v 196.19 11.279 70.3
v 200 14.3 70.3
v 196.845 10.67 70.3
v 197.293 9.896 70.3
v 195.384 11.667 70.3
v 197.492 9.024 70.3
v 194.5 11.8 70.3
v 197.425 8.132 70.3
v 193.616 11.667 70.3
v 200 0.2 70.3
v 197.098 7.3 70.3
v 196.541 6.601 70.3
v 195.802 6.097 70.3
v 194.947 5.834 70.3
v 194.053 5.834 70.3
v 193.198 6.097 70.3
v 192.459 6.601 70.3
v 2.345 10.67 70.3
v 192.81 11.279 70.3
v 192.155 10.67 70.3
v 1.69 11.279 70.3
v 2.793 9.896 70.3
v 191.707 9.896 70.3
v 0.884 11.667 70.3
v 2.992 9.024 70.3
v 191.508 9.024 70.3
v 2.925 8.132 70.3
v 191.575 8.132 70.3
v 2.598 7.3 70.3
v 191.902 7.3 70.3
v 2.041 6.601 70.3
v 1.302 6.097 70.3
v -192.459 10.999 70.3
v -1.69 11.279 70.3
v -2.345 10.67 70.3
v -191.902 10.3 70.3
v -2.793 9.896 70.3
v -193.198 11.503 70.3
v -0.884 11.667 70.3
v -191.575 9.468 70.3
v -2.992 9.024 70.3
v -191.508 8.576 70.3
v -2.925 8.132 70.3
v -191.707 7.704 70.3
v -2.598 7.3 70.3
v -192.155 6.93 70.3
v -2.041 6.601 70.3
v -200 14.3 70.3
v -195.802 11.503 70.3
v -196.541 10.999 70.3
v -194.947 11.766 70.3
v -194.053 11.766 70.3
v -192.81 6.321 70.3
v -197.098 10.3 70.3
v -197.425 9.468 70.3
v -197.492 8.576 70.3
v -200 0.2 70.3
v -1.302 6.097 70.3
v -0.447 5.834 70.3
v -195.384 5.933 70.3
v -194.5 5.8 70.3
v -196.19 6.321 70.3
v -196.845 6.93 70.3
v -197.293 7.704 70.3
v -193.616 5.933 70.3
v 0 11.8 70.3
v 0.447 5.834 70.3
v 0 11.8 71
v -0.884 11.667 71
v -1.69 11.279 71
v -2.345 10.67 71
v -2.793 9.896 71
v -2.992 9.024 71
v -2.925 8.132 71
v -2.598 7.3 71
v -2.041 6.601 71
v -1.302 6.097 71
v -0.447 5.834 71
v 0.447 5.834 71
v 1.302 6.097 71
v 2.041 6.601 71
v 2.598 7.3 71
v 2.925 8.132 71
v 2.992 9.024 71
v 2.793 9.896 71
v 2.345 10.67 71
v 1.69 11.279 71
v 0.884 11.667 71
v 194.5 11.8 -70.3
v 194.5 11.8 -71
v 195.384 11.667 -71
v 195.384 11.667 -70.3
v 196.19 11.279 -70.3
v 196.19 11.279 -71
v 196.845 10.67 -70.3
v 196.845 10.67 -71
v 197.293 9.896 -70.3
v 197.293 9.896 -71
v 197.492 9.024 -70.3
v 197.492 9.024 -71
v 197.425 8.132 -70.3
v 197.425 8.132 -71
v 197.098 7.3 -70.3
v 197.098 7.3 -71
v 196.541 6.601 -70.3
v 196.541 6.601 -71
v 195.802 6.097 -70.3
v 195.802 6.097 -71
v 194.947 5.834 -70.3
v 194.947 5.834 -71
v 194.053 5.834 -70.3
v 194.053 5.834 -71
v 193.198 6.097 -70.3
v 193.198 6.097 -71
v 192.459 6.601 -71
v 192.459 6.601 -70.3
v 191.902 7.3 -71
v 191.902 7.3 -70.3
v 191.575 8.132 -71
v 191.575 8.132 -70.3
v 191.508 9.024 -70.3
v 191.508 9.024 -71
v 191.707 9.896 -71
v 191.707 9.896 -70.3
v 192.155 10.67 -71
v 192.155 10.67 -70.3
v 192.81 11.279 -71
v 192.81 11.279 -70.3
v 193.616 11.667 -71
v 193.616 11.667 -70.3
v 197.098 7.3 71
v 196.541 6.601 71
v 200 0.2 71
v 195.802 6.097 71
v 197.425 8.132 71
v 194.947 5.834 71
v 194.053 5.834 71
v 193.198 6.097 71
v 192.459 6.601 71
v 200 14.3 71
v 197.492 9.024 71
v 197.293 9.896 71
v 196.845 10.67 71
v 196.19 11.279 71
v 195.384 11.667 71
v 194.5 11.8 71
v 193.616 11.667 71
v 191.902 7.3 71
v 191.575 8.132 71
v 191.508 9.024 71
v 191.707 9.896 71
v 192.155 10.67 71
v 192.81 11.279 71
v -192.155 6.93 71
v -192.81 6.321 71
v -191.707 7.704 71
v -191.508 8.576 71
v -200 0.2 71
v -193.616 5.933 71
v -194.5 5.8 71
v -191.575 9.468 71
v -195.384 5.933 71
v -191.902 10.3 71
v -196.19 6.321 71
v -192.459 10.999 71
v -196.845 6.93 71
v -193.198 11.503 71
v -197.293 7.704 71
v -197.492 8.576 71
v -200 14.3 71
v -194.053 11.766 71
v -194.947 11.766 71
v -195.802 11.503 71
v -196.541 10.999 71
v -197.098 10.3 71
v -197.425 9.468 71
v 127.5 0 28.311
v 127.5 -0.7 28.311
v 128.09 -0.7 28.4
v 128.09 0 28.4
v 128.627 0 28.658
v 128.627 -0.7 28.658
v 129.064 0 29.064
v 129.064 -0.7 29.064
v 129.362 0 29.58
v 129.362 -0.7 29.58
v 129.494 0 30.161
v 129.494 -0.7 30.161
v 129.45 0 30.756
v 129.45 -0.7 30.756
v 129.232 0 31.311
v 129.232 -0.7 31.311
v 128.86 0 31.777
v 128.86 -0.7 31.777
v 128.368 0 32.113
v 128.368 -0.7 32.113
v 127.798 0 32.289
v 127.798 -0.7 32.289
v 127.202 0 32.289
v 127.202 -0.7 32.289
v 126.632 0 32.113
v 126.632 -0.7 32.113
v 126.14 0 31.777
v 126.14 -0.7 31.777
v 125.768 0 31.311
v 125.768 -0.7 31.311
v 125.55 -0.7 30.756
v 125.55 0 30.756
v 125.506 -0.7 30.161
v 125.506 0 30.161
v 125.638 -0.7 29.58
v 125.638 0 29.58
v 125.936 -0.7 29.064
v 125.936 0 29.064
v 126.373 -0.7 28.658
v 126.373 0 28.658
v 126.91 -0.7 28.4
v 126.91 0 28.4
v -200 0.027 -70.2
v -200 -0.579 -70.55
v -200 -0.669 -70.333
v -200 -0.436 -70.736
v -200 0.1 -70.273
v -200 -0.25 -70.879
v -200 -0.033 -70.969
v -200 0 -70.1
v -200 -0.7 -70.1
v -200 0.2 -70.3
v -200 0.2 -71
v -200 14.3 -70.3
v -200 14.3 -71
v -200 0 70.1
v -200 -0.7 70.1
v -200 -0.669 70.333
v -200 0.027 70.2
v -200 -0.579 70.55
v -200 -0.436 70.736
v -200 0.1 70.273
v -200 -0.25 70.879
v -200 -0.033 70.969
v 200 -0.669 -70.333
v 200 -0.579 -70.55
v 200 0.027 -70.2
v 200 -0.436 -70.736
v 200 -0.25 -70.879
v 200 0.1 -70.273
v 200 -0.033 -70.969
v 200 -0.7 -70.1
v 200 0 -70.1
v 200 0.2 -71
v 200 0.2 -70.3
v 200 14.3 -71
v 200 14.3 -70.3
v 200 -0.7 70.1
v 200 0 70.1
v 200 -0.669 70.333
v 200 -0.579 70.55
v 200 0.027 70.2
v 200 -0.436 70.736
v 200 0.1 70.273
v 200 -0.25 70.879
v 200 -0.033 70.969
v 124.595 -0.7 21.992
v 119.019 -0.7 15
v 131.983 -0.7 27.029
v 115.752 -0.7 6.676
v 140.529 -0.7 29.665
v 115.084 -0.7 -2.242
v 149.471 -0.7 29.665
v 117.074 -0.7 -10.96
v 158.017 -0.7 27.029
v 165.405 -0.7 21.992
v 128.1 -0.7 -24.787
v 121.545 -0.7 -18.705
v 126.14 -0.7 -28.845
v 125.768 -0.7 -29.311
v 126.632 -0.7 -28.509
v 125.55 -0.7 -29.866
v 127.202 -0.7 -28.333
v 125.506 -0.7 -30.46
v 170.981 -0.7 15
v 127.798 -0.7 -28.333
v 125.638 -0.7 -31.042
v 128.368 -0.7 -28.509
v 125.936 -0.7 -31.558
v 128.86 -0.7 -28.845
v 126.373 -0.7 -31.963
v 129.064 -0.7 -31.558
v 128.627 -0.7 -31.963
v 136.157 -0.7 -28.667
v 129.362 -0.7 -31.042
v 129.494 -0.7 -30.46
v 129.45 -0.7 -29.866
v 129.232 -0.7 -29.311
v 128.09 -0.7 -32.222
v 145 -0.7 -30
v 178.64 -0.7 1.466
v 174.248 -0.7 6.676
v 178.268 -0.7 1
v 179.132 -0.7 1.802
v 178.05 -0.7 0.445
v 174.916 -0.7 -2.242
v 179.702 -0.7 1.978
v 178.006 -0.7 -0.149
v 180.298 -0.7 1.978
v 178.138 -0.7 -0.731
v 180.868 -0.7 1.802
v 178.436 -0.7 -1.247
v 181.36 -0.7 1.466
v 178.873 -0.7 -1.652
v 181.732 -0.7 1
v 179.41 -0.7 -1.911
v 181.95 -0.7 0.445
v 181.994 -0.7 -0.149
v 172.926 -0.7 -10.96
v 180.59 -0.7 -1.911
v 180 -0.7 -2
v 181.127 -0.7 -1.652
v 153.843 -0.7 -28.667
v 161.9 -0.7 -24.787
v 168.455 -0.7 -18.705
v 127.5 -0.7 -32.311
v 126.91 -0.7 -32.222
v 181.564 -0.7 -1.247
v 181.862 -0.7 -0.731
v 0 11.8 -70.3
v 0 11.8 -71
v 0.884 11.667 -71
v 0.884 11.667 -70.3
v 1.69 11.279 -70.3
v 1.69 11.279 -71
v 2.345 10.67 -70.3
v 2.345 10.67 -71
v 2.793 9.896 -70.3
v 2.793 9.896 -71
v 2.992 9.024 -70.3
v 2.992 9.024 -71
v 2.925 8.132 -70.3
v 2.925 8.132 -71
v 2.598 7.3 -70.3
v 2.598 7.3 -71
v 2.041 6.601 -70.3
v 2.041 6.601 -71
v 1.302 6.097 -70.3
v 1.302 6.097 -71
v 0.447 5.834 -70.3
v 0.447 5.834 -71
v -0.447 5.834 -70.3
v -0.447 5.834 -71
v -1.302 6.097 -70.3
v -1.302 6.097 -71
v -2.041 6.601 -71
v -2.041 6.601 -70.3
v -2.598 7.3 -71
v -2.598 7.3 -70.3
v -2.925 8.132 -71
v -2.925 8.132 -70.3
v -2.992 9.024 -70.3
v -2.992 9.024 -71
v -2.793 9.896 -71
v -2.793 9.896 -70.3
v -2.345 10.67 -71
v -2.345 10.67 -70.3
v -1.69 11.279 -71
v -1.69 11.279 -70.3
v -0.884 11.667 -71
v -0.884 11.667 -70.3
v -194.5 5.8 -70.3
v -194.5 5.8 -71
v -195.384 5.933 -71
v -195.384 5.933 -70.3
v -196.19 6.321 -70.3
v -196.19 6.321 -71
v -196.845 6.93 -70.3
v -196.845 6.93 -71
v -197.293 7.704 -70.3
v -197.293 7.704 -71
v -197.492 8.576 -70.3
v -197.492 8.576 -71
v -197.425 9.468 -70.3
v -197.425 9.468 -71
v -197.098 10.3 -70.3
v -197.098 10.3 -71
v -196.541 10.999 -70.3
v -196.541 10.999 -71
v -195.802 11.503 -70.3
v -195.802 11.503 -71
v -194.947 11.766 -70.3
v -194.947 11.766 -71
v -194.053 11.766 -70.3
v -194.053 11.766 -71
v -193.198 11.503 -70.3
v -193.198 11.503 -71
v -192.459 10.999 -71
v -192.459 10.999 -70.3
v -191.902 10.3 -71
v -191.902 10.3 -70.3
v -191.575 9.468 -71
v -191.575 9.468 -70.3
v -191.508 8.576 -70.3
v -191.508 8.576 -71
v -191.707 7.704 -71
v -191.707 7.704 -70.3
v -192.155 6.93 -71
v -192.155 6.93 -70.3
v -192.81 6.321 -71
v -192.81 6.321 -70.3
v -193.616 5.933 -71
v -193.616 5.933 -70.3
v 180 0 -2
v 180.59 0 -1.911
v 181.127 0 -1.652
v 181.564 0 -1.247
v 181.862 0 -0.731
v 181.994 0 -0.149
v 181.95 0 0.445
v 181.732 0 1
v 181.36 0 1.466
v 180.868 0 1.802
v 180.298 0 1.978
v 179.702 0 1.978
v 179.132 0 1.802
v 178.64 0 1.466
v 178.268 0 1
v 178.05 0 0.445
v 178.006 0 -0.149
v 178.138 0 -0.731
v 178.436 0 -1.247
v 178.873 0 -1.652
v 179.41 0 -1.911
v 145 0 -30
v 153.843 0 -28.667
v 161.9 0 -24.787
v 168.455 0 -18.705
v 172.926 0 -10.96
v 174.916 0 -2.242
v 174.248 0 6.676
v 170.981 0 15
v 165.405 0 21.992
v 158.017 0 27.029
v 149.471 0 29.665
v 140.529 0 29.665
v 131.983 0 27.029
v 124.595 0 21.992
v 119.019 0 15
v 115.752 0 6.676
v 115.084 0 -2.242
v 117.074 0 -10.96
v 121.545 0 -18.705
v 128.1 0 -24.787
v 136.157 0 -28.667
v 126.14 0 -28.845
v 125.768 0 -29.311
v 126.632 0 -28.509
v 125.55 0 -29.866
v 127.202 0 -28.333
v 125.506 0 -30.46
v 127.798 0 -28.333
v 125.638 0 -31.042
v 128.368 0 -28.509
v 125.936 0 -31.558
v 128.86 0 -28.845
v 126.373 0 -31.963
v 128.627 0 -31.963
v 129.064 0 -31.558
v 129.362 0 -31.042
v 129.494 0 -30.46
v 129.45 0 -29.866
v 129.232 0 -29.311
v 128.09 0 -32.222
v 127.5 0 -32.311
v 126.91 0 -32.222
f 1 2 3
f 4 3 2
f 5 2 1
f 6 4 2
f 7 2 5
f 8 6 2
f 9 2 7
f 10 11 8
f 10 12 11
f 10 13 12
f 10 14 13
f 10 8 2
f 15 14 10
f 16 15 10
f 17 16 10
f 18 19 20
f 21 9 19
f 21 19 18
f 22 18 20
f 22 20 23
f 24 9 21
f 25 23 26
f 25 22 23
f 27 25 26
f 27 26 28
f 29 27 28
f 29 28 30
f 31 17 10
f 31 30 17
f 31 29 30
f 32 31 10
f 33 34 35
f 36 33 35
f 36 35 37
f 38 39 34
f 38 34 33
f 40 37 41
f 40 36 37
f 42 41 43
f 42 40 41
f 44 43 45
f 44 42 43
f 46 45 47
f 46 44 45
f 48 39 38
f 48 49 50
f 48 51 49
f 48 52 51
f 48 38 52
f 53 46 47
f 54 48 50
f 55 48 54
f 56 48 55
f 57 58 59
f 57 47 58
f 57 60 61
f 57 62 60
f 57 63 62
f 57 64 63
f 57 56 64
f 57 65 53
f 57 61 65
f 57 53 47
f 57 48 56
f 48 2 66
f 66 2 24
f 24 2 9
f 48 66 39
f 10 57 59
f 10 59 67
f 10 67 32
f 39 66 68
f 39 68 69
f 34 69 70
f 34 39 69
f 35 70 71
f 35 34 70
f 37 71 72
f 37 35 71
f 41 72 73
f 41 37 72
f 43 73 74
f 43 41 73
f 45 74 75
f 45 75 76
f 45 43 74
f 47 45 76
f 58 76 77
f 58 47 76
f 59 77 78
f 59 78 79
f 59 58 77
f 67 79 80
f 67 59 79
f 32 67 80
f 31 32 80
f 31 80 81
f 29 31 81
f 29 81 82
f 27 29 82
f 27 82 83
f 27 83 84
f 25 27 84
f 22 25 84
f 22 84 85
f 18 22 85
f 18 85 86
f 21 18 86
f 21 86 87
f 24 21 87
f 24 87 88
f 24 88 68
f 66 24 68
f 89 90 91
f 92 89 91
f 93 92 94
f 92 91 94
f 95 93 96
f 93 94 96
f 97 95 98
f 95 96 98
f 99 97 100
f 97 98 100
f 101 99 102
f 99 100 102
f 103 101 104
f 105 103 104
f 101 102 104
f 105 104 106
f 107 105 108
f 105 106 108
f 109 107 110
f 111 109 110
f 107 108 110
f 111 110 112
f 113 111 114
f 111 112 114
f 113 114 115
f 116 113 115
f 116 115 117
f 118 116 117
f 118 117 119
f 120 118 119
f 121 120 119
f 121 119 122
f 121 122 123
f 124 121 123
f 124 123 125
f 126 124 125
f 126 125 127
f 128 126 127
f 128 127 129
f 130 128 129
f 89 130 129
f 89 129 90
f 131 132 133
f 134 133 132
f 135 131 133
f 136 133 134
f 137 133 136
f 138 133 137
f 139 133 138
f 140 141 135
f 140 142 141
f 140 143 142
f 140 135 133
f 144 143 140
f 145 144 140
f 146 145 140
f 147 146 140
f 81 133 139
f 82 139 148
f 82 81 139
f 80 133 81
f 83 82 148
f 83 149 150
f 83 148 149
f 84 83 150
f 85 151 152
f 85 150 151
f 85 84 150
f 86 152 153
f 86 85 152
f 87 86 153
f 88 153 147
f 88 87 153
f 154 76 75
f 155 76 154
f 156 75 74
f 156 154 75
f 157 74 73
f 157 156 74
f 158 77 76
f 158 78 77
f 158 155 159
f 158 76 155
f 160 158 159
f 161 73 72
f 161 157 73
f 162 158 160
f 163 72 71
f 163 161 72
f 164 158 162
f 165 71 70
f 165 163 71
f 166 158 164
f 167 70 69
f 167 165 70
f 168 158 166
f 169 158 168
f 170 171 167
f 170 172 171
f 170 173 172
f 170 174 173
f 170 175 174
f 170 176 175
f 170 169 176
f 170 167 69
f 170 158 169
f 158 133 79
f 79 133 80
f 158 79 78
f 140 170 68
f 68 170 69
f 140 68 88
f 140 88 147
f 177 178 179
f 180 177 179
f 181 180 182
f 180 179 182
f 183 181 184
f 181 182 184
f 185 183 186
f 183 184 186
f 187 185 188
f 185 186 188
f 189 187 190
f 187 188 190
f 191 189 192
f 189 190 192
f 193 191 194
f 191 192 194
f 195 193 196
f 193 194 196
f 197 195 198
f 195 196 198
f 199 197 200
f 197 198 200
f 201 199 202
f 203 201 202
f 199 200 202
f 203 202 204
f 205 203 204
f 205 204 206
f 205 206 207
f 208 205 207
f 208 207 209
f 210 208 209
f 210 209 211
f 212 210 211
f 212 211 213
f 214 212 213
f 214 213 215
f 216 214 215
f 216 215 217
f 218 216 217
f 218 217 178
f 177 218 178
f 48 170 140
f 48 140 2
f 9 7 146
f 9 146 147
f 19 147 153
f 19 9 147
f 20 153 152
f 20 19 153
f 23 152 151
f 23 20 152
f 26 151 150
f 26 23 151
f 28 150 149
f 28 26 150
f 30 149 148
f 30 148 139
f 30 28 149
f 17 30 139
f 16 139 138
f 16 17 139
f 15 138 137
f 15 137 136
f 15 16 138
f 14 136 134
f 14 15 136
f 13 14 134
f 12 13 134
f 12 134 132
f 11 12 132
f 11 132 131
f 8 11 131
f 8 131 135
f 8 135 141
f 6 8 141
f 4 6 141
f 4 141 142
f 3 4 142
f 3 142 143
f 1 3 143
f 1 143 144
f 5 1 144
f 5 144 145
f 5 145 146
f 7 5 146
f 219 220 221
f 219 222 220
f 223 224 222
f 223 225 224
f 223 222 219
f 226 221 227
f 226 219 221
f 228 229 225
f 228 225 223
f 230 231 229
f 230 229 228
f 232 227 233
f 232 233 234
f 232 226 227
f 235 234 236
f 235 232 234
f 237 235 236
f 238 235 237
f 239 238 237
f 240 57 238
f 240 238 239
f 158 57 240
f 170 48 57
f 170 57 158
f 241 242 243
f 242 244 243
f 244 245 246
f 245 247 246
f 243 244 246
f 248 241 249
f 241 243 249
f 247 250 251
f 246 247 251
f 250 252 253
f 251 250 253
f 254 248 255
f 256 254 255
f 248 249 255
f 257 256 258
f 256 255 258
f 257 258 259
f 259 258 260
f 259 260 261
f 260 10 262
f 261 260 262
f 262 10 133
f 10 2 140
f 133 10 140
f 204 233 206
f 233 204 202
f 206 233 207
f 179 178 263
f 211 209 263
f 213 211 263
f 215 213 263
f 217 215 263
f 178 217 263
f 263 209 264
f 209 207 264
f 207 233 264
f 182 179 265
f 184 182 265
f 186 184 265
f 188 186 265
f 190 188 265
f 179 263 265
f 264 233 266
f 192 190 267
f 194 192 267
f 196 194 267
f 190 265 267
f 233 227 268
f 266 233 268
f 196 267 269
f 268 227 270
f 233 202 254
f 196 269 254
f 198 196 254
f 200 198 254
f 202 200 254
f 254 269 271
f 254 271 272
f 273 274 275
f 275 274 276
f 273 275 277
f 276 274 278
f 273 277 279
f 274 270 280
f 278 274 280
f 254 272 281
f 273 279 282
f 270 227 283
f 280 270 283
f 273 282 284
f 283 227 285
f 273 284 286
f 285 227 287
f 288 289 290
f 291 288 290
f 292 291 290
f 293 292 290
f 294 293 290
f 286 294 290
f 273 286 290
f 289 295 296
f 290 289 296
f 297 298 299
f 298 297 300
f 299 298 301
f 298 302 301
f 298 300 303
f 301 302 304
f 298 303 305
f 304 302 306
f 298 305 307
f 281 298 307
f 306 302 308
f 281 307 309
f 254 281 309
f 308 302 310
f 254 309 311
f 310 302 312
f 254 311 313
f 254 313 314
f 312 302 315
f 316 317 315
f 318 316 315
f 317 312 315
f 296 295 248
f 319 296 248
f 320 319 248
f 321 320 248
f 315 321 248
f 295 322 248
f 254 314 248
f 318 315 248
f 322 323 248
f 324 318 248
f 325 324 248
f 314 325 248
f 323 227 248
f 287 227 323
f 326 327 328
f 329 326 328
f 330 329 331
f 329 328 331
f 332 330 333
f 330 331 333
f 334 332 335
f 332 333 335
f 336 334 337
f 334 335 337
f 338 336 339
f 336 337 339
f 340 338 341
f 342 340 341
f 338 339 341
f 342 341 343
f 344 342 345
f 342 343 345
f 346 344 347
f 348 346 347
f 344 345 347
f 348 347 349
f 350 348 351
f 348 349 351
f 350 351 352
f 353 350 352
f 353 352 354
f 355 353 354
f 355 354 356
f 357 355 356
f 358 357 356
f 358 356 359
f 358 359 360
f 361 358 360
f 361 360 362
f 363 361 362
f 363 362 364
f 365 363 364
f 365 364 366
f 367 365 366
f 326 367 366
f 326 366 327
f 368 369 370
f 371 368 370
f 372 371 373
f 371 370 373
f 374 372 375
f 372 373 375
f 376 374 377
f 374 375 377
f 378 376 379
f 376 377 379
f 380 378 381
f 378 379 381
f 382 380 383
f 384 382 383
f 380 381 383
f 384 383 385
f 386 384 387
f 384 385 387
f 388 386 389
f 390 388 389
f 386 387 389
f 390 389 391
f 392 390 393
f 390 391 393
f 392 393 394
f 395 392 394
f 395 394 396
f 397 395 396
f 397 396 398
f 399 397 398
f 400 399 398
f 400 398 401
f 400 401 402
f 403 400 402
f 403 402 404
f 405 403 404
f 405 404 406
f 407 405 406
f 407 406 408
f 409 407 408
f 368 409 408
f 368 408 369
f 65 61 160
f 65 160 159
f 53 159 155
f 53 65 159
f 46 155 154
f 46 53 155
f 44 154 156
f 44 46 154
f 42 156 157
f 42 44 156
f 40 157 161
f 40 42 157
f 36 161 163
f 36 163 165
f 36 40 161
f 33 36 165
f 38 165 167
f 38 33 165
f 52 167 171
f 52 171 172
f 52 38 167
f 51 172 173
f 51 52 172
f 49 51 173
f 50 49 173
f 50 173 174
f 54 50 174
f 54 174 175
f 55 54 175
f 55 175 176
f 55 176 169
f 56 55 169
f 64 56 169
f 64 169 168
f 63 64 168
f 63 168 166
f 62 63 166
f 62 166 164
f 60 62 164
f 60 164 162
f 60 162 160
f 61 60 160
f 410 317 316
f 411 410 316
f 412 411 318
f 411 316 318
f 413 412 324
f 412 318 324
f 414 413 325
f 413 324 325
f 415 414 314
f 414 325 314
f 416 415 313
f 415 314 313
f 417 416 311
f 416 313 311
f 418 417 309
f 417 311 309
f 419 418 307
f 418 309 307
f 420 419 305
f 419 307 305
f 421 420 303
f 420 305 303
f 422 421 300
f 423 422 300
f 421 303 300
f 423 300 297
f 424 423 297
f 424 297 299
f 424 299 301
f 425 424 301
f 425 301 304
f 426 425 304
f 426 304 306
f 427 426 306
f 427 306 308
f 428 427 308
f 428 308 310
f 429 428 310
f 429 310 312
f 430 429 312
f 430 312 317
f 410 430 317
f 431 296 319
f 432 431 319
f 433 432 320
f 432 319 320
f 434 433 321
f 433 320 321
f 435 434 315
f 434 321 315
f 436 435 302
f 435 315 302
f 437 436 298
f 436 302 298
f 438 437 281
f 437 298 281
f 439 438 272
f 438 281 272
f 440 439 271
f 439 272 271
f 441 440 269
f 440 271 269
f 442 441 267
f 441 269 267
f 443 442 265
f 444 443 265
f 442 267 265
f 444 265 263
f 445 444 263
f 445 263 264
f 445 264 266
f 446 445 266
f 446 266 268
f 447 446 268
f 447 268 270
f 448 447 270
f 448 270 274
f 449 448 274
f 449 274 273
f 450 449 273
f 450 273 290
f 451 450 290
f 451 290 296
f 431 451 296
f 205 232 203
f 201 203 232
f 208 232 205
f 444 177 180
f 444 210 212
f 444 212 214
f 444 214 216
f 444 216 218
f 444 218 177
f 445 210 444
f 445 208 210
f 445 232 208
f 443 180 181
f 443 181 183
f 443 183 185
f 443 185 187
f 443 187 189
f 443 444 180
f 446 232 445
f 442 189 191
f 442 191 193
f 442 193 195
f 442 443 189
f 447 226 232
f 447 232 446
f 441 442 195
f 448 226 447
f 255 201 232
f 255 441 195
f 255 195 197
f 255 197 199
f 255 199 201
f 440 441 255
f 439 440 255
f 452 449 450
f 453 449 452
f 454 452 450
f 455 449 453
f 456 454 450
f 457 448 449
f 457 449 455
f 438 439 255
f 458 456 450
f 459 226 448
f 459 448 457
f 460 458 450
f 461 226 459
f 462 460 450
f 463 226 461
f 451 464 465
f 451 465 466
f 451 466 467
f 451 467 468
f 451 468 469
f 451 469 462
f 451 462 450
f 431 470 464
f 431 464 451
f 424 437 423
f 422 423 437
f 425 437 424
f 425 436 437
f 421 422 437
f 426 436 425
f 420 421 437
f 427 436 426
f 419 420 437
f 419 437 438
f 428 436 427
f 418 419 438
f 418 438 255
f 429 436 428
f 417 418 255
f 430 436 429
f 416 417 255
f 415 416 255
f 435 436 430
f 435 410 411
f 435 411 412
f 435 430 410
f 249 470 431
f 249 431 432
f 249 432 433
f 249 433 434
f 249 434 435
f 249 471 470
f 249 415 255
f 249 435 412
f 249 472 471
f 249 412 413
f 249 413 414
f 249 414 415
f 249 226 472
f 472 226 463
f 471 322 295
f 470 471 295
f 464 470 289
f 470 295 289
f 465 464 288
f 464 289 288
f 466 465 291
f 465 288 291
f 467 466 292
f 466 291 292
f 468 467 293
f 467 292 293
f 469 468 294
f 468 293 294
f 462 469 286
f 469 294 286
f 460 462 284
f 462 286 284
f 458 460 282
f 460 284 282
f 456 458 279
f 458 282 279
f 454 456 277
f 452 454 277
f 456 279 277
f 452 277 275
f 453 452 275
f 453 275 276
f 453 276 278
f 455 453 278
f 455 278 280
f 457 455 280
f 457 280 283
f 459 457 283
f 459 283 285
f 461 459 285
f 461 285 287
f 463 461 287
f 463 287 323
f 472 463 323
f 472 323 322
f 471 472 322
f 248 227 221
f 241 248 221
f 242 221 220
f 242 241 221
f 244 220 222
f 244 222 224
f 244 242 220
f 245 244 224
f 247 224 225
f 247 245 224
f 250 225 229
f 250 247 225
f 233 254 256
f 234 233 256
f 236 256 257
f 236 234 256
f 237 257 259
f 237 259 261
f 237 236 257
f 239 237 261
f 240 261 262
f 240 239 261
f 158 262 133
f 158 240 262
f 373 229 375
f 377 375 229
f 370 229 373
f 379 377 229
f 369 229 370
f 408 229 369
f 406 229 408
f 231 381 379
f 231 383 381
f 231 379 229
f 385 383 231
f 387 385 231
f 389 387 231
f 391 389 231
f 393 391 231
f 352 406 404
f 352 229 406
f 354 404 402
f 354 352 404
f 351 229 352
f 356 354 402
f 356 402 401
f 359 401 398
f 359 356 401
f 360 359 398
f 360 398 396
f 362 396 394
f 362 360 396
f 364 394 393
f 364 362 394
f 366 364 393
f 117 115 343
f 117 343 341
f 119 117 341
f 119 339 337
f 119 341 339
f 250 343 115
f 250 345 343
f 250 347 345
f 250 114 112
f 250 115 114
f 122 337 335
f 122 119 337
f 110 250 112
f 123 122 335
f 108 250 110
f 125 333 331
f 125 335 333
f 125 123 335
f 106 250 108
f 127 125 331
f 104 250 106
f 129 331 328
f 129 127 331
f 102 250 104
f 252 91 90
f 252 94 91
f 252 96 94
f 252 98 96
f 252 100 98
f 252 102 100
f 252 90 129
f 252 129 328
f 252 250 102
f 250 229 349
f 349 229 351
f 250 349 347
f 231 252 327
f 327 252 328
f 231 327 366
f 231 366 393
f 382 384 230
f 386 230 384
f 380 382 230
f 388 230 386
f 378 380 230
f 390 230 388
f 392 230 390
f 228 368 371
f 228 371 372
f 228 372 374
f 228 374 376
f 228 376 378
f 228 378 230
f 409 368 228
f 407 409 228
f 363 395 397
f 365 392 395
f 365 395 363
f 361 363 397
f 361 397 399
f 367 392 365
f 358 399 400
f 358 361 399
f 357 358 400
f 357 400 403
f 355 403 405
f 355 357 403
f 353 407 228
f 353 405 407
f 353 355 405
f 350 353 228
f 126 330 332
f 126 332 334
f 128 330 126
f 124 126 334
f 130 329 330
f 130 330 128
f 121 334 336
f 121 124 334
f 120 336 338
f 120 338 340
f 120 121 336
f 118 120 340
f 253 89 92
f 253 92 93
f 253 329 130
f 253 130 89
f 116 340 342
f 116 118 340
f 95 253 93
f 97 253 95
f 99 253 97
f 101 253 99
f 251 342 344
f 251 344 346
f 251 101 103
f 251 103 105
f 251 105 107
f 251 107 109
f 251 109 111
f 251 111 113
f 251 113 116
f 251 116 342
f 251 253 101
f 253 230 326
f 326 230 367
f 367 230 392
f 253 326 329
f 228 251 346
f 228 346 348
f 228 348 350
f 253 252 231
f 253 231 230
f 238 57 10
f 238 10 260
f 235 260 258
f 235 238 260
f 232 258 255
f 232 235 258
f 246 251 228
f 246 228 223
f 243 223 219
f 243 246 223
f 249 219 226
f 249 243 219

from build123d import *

# Parameters (mm, degrees)
SKETCH_1_W                         = 400
SKETCH_1_H                         = 142
SM_BASE_FLANGE_1_DEPTH             = 0.7
SM_EDGE_FLANGE_1_STRIP_W           = 3.2
SM_EDGE_FLANGE_1_STRIP_H           = 0.7
SM_EDGE_FLANGE_1_STRIP_CUT_DEPTH   = 400
SM_EDGE_FLANGE_1_STRIP_2_W         = 3.2
SM_EDGE_FLANGE_1_STRIP_2_H         = 0.7
SM_EDGE_FLANGE_1_STRIP_CUT_2_DEPTH = 400
SM_EDGE_FLANGE_1_DEPTH             = 400
SM_EDGE_FLANGE_1_BEND_DEPTH        = 400
SKETCH_17_R                        = 3
CUT_EXTRUDE_1_DEPTH                = 10
CUT_EXTRUDE_START                  = -10
SKETCH_18_R                        = 3
CUT_EXTRUDE_2_DEPTH                = 10
SKETCH_19_R                        = 30
SKETCH_19_R_2                      = 2
CUT_EXTRUDE_4_DEPTH                = 10


# Sheet-metal steps are written as plain solids
with BuildPart() as part:
    # 草图1 → 基体-法兰1 (new body)
    with BuildSketch(Plane(origin=(0, 0, 0), x_dir=(1, 0, 0), z_dir=(0, 1, 0))):
        Rectangle(SKETCH_1_W, SKETCH_1_H)
    extrude(amount=-SM_BASE_FLANGE_1_DEPTH)

    # 边线-法兰1 strip (across the edge) → 边线-法兰1 strip cut (cut)
    with BuildSketch(Plane(origin=(200, 0, -71), x_dir=(0, 0, 1), z_dir=(-1, 0, 0))):
        with Locations((-0.7, -0.35)):
            Rectangle(SM_EDGE_FLANGE_1_STRIP_W, SM_EDGE_FLANGE_1_STRIP_H)
    extrude(amount=SM_EDGE_FLANGE_1_STRIP_CUT_DEPTH, mode=Mode.SUBTRACT)

    # 边线-法兰1 strip 2 (across the edge) → 边线-法兰1 strip cut 2 (cut)
    with BuildSketch(Plane(origin=(-200, 0, 71), x_dir=(0, 0, -1), z_dir=(1, 0, 0))):
        with Locations((-0.7, -0.35)):
            Rectangle(SM_EDGE_FLANGE_1_STRIP_2_W, SM_EDGE_FLANGE_1_STRIP_2_H)
    extrude(amount=SM_EDGE_FLANGE_1_STRIP_CUT_2_DEPTH, mode=Mode.SUBTRACT)

    # 边线-法兰1 section (across the edge) → 边线-法兰1 (add)
    with BuildSketch(Plane(origin=(200, 0, -71), x_dir=(0, 0, 1), z_dir=(-1, 0, 0))):
        with BuildLine():
            Line((0, 0.2), (0, 14.3))
            Line((0, 14.3), (0.7, 14.3))
            Line((0.7, 14.3), (0.7, 0.2))
            ThreePointArc((0.7, 0.2), (0.758578644, 0.058578644), (0.9, 0))
            Line((0.9, 0), (0.9, -0.7))
            ThreePointArc((0.9, -0.7), (0.263603897, -0.436396103), (0, 0.2))
        make_face()
    extrude(amount=SM_EDGE_FLANGE_1_DEPTH)

    # 边线-法兰1 section 2 (across the edge) → 边线-法兰1 bend (add)
    with BuildSketch(Plane(origin=(-200, 0, 71), x_dir=(0, 0, -1), z_dir=(1, 0, 0))):
        with BuildLine():
            Line((0, 0.2), (0, 14.3))
            Line((0, 14.3), (0.7, 14.3))
            Line((0.7, 14.3), (0.7, 0.2))
            ThreePointArc((0.7, 0.2), (0.758578644, 0.058578644), (0.9, 0))
            Line((0.9, 0), (0.9, -0.7))
            ThreePointArc((0.9, -0.7), (0.263603897, -0.436396103), (0, 0.2))
        make_face()
    extrude(amount=SM_EDGE_FLANGE_1_BEND_DEPTH)

    # 草图17 → 切除-拉伸1 (cut)
    with BuildSketch(Plane(origin=(0, 0, -71), x_dir=(-1, 0, 0), z_dir=(0, 0, -1))):
        with Locations(Location((-194.5, 8.8, 0), (0, 0, 90))):
            Circle(SKETCH_17_R)
        with Locations(Location((0, 8.8, 0), (0, 0, 90))):
            Circle(SKETCH_17_R)
        with Locations(Location((194.5, 8.8, 0), (0, 0, 270))):
            Circle(SKETCH_17_R)
    extrude(amount=-CUT_EXTRUDE_1_DEPTH, mode=Mode.SUBTRACT)

    # 草图18 → 切除-拉伸2 (cut)
    with BuildSketch(Plane.XY.offset(71).offset(CUT_EXTRUDE_START)):
        with Locations(Location((-194.5, 8.8, 0), (0, 0, 270))):
            Circle(SKETCH_18_R)
        with Locations(Location((0, 8.8, 0), (0, 0, 90))):
            Circle(SKETCH_18_R)
        with Locations(Location((194.5, 8.8, 0), (0, 0, 90))):
            Circle(SKETCH_18_R)
    extrude(amount=CUT_EXTRUDE_2_DEPTH, mode=Mode.SUBTRACT)

    # 草图19 → 切除-拉伸4 (cut)
    with BuildSketch(Plane.XZ.offset(0.7)):
        with Locations(Location((145, 0, 0), (0, 0, 270))):
            Circle(SKETCH_19_R)
        with Locations(Location((127.5, 30.310889132, 0), (0, 0, 270))):
            Circle(SKETCH_19_R_2)
        with Locations(Location((180, 0, 0), (0, 0, 270))):
            Circle(SKETCH_19_R_2)
        with Locations(Location((127.5, -30.310889132, 0), (0, 0, 270))):
            Circle(SKETCH_19_R_2)
    extrude(amount=-CUT_EXTRUDE_4_DEPTH, mode=Mode.SUBTRACT)


solid = part.part
